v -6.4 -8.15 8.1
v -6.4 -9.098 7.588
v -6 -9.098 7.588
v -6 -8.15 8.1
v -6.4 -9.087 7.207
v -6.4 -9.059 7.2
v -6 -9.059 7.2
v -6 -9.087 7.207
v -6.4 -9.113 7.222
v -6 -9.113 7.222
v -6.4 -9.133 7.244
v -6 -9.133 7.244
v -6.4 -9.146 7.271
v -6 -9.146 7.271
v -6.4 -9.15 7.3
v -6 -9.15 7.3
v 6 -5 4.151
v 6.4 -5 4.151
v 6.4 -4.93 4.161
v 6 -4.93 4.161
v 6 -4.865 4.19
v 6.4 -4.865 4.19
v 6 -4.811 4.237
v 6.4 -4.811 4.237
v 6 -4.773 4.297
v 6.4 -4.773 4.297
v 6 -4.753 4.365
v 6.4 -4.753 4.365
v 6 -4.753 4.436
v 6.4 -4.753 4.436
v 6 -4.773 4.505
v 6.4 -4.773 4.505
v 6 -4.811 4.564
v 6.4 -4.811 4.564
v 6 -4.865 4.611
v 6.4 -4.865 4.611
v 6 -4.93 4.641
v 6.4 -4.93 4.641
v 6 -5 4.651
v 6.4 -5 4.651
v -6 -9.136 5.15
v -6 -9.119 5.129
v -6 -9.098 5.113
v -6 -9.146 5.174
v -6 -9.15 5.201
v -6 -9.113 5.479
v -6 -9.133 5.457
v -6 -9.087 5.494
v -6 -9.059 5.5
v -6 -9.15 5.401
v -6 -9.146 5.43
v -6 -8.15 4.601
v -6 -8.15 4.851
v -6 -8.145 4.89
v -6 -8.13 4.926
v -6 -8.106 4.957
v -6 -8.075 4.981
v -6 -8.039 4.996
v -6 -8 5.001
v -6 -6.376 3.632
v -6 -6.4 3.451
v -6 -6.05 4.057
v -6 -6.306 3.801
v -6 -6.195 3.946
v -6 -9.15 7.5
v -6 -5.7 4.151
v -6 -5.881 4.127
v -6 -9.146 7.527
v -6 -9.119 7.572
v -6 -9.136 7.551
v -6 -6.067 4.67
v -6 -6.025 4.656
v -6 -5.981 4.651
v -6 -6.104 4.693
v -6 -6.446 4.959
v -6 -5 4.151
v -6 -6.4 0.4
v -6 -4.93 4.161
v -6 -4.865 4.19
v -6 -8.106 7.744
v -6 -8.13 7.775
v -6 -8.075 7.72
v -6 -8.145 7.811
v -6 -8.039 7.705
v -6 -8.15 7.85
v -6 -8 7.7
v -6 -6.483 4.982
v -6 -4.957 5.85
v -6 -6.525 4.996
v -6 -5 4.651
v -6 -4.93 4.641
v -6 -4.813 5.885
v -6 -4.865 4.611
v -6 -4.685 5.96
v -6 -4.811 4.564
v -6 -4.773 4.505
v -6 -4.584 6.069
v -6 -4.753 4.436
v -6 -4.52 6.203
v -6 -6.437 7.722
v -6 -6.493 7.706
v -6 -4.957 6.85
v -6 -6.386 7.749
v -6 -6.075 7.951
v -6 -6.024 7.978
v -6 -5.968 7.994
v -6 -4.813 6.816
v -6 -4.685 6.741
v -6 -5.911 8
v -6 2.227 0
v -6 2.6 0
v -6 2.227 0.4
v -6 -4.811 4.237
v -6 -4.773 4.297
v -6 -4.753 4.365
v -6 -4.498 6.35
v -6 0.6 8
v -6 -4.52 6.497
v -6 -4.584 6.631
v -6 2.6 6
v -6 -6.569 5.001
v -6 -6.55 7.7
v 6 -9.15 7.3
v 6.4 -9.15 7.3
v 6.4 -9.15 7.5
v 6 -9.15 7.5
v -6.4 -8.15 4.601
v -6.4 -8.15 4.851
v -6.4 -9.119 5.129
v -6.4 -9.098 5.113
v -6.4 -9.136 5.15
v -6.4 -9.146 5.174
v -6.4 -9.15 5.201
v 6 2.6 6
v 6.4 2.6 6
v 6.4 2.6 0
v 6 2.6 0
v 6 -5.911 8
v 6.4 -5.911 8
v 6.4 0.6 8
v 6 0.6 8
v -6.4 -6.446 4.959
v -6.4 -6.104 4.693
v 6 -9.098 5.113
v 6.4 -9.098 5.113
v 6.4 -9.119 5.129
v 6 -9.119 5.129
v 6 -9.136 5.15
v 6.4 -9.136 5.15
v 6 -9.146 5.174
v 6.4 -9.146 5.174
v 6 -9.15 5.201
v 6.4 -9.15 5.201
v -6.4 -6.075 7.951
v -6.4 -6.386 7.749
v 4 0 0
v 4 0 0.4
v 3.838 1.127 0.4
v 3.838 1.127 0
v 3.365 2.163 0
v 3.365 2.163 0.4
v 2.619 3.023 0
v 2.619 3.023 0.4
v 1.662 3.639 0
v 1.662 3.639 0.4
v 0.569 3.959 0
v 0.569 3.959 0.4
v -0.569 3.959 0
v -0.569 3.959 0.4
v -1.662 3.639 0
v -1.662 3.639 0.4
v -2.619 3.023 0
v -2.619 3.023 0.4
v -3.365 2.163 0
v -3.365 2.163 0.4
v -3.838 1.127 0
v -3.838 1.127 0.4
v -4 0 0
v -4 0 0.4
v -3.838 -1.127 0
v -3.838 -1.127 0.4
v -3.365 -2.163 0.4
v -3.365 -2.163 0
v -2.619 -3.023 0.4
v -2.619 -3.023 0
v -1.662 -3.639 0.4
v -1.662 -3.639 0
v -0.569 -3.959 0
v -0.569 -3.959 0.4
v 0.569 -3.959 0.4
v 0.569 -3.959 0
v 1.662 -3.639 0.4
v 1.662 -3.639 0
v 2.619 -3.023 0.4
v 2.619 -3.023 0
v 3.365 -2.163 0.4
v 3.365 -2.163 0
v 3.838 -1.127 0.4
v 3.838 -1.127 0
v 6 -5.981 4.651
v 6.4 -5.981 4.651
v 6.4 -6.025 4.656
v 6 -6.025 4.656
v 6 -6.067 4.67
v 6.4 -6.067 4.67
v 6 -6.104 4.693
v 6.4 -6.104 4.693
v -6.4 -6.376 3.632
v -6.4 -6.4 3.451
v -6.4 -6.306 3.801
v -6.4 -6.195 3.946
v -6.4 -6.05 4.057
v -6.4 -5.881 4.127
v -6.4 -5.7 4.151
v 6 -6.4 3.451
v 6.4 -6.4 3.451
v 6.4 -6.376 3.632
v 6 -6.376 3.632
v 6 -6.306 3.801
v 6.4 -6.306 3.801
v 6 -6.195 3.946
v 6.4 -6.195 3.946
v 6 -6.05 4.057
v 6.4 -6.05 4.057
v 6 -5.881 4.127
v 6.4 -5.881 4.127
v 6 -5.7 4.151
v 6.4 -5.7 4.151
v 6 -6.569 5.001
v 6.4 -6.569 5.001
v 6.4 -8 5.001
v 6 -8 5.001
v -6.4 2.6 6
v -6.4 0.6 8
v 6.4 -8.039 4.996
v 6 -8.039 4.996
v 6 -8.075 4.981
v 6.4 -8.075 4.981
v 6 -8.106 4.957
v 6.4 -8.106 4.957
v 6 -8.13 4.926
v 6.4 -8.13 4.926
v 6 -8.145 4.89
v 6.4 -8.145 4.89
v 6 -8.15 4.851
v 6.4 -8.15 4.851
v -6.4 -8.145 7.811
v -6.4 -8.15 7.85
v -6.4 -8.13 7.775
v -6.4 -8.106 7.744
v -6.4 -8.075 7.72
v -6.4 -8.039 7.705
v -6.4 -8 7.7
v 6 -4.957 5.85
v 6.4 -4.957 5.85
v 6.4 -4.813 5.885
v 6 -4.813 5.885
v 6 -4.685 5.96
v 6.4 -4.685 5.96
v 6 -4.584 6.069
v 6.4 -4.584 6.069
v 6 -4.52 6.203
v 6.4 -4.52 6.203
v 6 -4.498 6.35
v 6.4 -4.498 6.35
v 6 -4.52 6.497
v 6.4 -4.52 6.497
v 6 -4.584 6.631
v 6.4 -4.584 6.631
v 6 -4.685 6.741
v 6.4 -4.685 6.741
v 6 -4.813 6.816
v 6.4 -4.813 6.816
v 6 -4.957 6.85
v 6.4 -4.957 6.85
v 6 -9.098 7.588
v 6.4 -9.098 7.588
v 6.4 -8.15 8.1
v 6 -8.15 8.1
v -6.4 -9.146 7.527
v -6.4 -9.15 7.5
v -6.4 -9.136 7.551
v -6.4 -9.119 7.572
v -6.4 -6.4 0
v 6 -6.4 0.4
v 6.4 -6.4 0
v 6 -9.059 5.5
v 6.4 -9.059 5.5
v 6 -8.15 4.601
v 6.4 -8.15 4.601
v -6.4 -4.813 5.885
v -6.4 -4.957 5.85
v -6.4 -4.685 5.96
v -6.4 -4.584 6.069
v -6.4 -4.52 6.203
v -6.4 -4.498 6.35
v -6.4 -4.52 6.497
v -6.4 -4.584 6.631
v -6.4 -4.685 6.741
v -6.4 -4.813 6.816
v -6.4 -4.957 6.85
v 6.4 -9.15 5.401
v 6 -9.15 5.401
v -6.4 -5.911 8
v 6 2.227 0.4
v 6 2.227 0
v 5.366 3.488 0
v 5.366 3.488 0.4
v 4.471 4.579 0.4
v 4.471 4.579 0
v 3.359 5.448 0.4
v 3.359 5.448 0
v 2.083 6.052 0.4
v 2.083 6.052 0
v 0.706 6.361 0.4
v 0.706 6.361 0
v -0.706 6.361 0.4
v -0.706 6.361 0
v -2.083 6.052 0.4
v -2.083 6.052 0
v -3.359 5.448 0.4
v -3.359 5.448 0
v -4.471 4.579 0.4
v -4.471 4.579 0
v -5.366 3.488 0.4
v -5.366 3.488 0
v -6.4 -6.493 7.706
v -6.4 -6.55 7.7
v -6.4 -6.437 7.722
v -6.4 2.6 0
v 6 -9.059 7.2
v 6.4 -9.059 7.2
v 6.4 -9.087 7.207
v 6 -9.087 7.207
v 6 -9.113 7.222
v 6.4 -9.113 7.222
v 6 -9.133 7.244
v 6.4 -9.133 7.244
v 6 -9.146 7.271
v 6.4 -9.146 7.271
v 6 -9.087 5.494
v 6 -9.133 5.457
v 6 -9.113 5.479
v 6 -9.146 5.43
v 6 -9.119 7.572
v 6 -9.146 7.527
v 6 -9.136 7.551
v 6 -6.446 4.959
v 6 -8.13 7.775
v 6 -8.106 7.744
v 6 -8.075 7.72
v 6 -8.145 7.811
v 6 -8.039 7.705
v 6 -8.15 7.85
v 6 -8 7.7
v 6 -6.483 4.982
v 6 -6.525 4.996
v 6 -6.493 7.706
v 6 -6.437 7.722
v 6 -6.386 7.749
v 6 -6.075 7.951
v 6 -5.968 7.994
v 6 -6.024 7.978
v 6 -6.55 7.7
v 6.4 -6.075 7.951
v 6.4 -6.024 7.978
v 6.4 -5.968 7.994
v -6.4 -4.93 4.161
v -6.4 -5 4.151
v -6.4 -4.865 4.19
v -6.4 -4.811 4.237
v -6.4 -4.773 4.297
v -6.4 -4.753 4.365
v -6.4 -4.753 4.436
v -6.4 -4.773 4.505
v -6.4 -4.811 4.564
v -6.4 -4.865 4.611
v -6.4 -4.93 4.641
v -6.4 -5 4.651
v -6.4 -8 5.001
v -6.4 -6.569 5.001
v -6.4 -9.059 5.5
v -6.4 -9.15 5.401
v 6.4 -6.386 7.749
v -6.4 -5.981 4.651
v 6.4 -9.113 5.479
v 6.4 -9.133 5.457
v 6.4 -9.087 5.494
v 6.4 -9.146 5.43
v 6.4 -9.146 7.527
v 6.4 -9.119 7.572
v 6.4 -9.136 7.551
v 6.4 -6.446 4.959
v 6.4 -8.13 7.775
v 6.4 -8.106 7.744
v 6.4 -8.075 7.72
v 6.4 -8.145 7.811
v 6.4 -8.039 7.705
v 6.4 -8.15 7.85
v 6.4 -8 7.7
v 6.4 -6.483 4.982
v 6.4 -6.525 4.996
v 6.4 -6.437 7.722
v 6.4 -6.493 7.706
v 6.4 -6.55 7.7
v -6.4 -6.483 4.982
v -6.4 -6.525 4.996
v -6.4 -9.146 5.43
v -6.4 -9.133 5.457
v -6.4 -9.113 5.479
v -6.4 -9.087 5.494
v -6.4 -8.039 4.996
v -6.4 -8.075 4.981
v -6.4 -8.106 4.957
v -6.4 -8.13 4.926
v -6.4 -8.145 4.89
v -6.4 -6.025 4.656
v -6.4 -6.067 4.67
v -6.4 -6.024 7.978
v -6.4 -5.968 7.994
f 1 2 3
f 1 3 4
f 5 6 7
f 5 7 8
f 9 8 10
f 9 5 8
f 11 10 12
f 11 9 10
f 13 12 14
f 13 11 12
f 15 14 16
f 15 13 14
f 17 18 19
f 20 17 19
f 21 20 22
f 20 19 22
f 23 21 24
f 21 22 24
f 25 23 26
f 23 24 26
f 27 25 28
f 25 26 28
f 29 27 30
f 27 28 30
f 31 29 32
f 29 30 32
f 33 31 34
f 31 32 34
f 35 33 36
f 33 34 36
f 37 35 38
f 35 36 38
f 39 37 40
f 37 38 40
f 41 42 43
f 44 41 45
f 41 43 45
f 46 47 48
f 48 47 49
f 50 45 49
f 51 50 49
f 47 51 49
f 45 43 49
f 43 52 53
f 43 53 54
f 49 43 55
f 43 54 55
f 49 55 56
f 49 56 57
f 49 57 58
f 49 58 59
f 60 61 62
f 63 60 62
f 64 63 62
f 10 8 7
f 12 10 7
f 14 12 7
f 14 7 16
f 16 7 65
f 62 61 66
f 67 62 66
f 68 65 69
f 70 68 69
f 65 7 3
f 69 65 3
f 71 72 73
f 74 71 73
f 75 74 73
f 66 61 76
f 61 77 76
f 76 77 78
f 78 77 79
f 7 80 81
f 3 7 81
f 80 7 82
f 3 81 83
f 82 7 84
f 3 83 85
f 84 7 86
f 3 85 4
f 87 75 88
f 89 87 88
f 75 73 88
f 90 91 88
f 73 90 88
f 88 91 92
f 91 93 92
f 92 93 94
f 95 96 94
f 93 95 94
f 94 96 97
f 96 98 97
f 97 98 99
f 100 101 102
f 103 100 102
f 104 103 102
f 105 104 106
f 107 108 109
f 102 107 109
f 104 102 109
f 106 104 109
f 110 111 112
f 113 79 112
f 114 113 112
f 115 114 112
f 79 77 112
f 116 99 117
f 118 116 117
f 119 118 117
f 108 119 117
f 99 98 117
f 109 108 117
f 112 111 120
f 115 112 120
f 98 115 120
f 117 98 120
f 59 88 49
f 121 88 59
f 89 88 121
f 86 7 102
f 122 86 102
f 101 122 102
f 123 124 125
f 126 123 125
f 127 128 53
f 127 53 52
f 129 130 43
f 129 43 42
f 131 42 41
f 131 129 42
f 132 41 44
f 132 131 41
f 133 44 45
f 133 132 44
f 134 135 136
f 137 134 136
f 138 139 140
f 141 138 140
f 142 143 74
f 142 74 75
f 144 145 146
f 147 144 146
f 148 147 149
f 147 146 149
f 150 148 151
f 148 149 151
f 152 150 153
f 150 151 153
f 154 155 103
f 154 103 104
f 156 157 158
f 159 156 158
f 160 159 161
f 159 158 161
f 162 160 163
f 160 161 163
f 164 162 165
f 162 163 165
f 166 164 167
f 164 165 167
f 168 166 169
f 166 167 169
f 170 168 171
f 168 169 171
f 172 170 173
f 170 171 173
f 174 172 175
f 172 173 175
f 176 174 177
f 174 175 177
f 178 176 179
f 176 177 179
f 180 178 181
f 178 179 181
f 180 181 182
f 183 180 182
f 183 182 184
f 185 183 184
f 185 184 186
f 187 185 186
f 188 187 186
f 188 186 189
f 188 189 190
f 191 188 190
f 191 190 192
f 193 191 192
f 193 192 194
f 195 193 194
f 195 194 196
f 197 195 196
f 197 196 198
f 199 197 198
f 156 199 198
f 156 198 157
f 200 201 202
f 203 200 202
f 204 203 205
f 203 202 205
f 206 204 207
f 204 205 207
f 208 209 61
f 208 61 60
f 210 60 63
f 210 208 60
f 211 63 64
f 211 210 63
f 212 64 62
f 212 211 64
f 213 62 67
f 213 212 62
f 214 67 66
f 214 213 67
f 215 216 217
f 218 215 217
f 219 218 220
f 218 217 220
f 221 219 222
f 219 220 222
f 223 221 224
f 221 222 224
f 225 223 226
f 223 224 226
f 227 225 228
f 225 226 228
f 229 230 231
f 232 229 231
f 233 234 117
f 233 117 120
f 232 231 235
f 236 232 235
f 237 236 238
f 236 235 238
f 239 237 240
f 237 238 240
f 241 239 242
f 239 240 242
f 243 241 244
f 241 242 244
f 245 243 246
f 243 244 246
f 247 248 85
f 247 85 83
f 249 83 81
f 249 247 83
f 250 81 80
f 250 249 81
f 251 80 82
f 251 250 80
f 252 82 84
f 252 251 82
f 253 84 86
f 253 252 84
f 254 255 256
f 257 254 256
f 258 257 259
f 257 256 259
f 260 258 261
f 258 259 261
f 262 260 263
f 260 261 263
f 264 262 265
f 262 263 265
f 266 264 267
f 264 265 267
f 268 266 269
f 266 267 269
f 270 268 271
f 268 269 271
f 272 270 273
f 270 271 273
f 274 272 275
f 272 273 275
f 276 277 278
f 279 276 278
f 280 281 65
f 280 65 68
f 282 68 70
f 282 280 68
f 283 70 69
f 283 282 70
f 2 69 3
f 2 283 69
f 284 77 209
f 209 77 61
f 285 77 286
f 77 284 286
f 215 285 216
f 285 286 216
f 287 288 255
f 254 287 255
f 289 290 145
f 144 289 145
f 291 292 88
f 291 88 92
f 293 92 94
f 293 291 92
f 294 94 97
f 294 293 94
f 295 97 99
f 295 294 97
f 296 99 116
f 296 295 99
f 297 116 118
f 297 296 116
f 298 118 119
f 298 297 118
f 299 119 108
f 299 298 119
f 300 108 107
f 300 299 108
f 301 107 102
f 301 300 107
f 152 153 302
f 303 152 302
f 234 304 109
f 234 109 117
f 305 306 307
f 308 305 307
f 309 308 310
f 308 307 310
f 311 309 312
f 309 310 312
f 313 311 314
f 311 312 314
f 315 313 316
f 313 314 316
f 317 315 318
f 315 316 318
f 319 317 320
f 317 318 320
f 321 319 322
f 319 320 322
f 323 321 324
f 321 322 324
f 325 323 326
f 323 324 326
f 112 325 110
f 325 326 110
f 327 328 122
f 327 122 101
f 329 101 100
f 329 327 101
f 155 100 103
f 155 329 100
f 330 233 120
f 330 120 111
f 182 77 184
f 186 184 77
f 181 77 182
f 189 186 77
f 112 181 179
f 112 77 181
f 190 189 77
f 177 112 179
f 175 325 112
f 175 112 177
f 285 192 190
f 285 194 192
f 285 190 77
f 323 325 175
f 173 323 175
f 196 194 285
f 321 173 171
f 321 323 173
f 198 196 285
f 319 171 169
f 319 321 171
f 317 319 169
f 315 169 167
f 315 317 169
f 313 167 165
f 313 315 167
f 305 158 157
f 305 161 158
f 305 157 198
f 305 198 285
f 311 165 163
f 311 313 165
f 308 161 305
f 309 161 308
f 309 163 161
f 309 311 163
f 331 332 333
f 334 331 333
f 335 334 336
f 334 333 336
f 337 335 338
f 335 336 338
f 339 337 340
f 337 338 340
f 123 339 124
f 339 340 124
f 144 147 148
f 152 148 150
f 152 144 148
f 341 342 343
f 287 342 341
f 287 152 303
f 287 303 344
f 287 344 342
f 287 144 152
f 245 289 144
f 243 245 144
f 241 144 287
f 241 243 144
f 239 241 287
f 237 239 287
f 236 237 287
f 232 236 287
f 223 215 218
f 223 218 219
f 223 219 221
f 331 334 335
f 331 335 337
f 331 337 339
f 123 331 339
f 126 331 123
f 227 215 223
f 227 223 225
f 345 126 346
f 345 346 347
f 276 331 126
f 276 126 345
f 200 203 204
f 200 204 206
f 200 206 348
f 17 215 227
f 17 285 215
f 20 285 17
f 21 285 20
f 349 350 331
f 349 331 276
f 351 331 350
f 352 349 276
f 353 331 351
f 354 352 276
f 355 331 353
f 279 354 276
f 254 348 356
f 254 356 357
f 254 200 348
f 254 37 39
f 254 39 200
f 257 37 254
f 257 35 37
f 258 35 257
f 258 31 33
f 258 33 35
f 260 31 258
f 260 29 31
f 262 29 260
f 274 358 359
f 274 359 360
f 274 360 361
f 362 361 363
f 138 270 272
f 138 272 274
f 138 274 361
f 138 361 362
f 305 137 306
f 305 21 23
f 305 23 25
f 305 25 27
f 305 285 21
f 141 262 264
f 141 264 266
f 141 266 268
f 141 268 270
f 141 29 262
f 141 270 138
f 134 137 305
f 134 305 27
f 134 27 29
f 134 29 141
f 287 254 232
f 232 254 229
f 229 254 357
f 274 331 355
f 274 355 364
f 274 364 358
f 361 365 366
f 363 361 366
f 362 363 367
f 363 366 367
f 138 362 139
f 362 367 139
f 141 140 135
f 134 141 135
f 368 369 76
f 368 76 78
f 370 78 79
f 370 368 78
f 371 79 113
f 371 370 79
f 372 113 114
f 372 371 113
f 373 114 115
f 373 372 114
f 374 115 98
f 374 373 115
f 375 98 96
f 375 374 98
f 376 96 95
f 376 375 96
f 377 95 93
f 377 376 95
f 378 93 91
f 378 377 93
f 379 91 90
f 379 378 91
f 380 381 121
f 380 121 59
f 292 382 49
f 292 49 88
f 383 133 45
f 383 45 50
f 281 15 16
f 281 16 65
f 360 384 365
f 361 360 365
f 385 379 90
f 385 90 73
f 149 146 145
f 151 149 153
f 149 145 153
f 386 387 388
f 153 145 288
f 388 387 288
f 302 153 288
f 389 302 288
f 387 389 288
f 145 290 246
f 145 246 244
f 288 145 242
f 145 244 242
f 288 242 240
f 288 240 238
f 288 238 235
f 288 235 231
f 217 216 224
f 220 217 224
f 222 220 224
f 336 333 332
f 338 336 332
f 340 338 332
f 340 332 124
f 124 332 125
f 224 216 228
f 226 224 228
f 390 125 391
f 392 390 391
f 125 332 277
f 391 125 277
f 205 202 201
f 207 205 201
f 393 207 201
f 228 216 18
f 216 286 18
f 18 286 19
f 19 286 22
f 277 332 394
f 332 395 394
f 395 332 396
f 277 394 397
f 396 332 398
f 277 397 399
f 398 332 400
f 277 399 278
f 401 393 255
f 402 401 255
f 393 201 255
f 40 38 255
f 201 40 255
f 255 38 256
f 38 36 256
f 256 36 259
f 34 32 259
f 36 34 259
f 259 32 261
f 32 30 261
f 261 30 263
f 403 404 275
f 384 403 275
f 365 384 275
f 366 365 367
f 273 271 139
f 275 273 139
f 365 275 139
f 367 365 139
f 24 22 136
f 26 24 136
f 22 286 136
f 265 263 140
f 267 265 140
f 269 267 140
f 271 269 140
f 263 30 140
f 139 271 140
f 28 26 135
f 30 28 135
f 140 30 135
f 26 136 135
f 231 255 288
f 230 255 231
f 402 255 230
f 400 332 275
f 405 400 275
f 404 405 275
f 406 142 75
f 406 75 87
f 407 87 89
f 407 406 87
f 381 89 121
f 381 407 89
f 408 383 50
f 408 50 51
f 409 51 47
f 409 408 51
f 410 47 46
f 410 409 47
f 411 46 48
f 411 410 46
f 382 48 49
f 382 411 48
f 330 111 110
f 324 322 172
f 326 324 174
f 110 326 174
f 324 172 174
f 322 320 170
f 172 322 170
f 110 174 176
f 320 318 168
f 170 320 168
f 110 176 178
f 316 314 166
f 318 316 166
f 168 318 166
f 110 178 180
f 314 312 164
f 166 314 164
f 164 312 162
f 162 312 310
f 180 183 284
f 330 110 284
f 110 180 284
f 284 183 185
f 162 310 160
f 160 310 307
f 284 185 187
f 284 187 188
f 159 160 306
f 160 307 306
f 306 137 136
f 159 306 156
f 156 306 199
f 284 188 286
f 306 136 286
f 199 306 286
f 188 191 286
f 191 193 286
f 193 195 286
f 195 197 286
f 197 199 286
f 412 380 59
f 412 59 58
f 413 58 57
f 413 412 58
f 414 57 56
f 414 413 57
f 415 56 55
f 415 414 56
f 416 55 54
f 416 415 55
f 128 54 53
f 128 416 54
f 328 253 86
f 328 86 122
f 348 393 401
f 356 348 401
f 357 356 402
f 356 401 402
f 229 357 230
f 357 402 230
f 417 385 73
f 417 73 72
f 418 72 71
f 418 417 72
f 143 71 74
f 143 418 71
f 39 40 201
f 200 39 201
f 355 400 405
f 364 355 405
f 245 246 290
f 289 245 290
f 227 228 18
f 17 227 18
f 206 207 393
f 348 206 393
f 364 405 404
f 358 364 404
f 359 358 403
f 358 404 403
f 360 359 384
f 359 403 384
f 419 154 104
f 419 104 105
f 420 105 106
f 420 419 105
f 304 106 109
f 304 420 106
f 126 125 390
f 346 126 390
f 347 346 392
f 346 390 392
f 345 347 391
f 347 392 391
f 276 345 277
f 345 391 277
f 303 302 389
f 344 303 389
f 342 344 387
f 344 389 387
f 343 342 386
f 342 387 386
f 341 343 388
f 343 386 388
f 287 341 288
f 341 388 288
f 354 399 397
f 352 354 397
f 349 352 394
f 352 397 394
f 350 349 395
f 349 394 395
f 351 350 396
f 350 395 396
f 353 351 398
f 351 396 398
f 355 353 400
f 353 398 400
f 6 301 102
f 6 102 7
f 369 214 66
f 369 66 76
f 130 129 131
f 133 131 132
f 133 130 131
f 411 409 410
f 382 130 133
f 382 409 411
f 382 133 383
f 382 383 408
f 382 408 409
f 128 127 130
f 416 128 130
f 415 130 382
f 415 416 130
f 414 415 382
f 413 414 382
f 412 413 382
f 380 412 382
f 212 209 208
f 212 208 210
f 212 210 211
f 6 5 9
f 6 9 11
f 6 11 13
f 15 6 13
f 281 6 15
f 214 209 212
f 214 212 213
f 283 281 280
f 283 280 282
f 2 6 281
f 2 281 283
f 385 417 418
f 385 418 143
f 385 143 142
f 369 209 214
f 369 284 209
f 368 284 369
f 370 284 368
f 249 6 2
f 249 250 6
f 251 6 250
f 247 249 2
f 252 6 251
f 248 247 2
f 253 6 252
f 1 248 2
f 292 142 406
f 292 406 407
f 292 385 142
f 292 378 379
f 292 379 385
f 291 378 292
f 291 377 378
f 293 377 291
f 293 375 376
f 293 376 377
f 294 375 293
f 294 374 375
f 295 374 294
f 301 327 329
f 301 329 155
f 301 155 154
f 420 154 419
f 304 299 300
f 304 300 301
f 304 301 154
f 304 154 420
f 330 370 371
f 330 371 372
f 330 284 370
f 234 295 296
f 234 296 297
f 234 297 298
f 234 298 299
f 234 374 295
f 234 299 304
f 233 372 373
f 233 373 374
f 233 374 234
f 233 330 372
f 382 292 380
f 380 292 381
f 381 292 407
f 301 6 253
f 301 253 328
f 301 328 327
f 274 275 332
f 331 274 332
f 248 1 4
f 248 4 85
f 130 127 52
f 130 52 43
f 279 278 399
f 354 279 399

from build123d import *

# Parameters (mm, degrees)
DODANIE_WYCI_GNI_CIE1_DEPTH = 0.4
WYTNIJ_WYCI_GNI_CIE1_REACH  = 11.06
SZKIC6_R                    = 4
DODANIE_WYCI_GNI_CIE4_DEPTH = 0.4


with BuildPart() as part:
    # Szkic1 → Dodanie-wyciągnięcie1 (new body)
    with BuildSketch(Plane.XY):
        with BuildLine():
            Line((0, -6.4), (6.4, -6.4))
            Line((6.4, -6.4), (6.4, 0))
            ThreePointArc((6.4, 0), (0, 6.4), (-6.4, 0))
            Line((-6.4, 0), (-6.4, -6.4))
            Line((-6.4, -6.4), (0, -6.4))
        make_face()
    extrude(amount=DODANIE_WYCI_GNI_CIE1_DEPTH)

    # Szkic6 → Wytnij-wyciągnięcie1 (cut, up to next)
    with BuildSketch(Plane.XY.offset(0.4), mode=Mode.PRIVATE) as wytnij_wyci_gni_cie1_sk1:
        Circle(SZKIC6_R)
    wytnij_wyci_gni_cie1_tool1 = extrude(wytnij_wyci_gni_cie1_sk1.sketch, amount=-WYTNIJ_WYCI_GNI_CIE1_REACH, mode=Mode.PRIVATE) & part.part
    add(wytnij_wyci_gni_cie1_tool1.solids().sort_by_distance((0, 0, 0.4))[0], mode=Mode.SUBTRACT)

    # Szkic5 → Dodanie-wyciągnięcie4 (add)
    with BuildSketch(Plane.ZY.offset(6.4)):
        with BuildLine():
            Line((5.000724361, -6.56862155), (5.000724361, -8))
            ThreePointArc((5.000724361, -8), (4.956790379, -8.106066017), (4.850724361, -8.15))
            Line((4.850724361, -8.15), (4.600724361, -8.15))
            Line((4.600724361, -8.15), (5.112747467, -9.097540152))
            ThreePointArc((5.112747467, -9.097540152), (5.149509203, -9.135889508), (5.200724361, -9.15))
            Line((5.200724361, -9.15), (5.400724361, -9.15))
            ThreePointArc((5.400724361, -9.15), (5.468361913, -9.123655697), (5.500362181, -9.058503233))
            Line((5.500362181, -9.058503233), (5.850362181, -4.957329291))
            ThreePointArc((5.850362181, -4.957329291), (6.350362181, -4.498182514), (6.850362181, -4.957329291))
            Line((6.850362181, -4.957329291), (7.200362181, -9.058503233))
            ThreePointArc((7.200362181, -9.058503233), (7.232362449, -9.123655697), (7.3, -9.15))
            Line((7.3, -9.15), (7.5, -9.15))
            ThreePointArc((7.5, -9.15), (7.551215158, -9.135889508), (7.587976894, -9.097540152))
            Line((7.587976894, -9.097540152), (8.1, -8.15))
            Line((8.1, -8.15), (7.85, -8.15))
            ThreePointArc((7.85, -8.15), (7.743933983, -8.106066017), (7.7, -8))
            Line((7.7, -8), (7.7, -6.55))
            ThreePointArc((7.7, -6.55), (7.712395552, -6.464655511), (7.748557878, -6.386363636))
            Line((7.748557878, -6.386363636), (7.951442122, -6.074613587))
            ThreePointArc((7.951442122, -6.074613587), (7.987604448, -5.996321712), (8, -5.910977223))
            Line((8, -5.910977223), (8, 0.6))
            Line((8, 0.6), (6, 2.6))
            Line((6, 2.6), (0, 2.6))
            Line((0, 2.6), (0, -6.4))
            Line((0, -6.4), (3.450724361, -6.4))
            ThreePointArc((3.450724361, -6.4), (3.945699108, -6.194974747), (4.150724361, -5.7))
            Line((4.150724361, -5.7), (4.150724361, -5))
            ThreePointArc((4.150724361, -5), (4.400724361, -4.75), (4.650724361, -5))
            Line((4.650724361, -5), (4.650724361, -5.98137845))
            ThreePointArc((4.650724361, -5.98137845), (4.661549722, -6.046285735), (4.692853918, -6.104166573))
            Line((4.692853918, -6.104166573), (4.958594805, -6.445833427))
            ThreePointArc((4.958594805, -6.445833427), (4.989899001, -6.503714265), (5.000724361, -6.56862155))
        make_face()
    dodanie_wyci_gni_cie4 = extrude(amount=-DODANIE_WYCI_GNI_CIE4_DEPTH)

    # Lustro1: Dodanie-wyciągnięcie4 across plane
    add(dodanie_wyci_gni_cie4.mirror(Plane(origin=(0, 0, 0), x_dir=(0, 0, 1), z_dir=(1, 0, 0))))


solid = part.part
